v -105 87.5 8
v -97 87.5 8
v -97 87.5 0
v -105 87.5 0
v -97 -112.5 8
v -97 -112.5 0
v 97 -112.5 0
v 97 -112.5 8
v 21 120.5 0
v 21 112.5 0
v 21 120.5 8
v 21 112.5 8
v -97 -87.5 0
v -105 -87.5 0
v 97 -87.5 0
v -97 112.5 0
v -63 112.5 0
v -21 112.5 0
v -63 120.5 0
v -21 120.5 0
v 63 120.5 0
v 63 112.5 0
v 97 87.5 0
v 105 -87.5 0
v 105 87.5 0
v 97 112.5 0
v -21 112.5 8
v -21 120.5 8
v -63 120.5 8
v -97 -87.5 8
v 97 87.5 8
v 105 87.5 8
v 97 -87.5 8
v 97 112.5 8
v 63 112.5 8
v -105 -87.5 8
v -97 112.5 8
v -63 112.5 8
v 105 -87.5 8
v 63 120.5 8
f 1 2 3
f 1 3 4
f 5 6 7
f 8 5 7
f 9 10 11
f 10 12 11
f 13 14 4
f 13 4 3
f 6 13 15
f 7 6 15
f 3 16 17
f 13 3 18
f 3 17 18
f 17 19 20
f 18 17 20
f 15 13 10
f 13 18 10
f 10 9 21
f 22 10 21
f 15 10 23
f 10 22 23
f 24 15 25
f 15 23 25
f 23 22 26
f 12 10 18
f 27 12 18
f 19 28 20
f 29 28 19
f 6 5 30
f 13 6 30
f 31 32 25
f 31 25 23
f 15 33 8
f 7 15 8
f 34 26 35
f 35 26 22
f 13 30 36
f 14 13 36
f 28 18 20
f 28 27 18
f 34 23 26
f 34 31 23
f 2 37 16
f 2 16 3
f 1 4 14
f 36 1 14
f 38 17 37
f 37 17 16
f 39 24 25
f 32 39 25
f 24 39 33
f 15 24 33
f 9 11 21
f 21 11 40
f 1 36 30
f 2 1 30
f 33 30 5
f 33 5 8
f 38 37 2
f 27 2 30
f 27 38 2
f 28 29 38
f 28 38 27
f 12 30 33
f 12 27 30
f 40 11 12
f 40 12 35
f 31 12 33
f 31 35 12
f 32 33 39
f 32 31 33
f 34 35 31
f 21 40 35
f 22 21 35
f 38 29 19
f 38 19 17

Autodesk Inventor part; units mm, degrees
ref_plane "YZ Plane" through (0, 0, 0) normal (1, 0, 0) x (0, 1, 0)
ref_plane "XZ Plane" through (0, 0, 0) normal (0, 1, 0) x (-1, 0, 0)
ref_plane "XY Plane" through (0, 0, 0) normal (0, 0, 1) x (1, 0, 0)
sketch "Sketch2" plane through (0, 0, 0) normal (0, 0, 1) x (1, 0, 0)
  line L0 (-105, -112.5) -> (105, -112.5)
  line L1 (105, -112.5) -> (105, 112.5)
  line L2 (105, 112.5) -> (-105, 112.5)
  line L3 (-105, 112.5) -> (-105, -112.5)
  line L4 (-105, -112.5) -> (105, 112.5) construction
  line L5 (105, -112.5) -> (-105, 112.5) construction
  point P0 (0, 0)
  dimension "d11" = 225
  dimension "d12" = 210
extrude "Extrusion2" add sketch "Sketch2" along normal blind 8
sketch "Sketch3" plane through (0, 0, 8) normal (0, 0, 1) x (1, 0, 0)
  line L0 (105, 112.5) -> (-105, 112.5) projected
  line L1 (-63, 112.5) -> (-21, 112.5)
  line L2 (-21, 112.5) -> (-21, 120.5)
  line L3 (-21, 120.5) -> (-63, 120.5)
  line L4 (-63, 120.5) -> (-63, 112.5)
  line L5 (63, 112.5) -> (21, 112.5)
  line L6 (21, 112.5) -> (21, 120.5)
  line L7 (21, 120.5) -> (63, 120.5)
  line L8 (63, 120.5) -> (63, 112.5)
  line L9 (-21, 120.5) -> (21, 120.5) construction
  line L10 (63, 120.5) -> (105, 120.5) construction
  line L11 (-63, 120.5) -> (-105, 120.5) construction
  point P0 (0, 0)
  dimension "d15" = 8
extrude "Extrusion3" add sketch "Sketch3" against normal blind 8
sketch "Sketch4" plane through (0, 0, 8) normal (0, 0, 1) x (1, 0, 0)
  line L0 (-105, 112.5) -> (-105, -112.5) projected
  line L1 (-105, -112.5) -> (-97, -112.5)
  line L2 (-97, -112.5) -> (-97, -87.5)
  line L3 (-97, -87.5) -> (-105, -87.5)
  line L4 (-105, -87.5) -> (-105, -112.5)
  line L5 (-105, 112.5) -> (-97, 112.5)
  line L6 (-97, 112.5) -> (-97, 87.5)
  line L7 (-97, 87.5) -> (-105, 87.5)
  line L8 (-105, 87.5) -> (-105, 112.5)
  line L9 (-97, -87.5) -> (-97, 87.5) construction
  point P0 (0, 0)
  dimension "d21" = 8
  dimension "d22" = 25
extrude "Extrusion4" cut sketch "Sketch4" against normal blind 8
mirror "Mirror2" about plane through (0, 0, 0) normal (1, 0, 0) of "Extrusion4"
properties part number "M06 - Wall Side 1" material "Polycarbonate, Clear"
